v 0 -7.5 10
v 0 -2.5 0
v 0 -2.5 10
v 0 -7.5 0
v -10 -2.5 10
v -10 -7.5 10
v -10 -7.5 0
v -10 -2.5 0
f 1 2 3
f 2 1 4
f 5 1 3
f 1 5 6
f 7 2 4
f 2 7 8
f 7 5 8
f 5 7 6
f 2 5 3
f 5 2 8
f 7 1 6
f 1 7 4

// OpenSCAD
$fn = 50;


difference() {
	union() {
		translate(v = [-10.0000000000, -7.5000000000, 0]) {
			cube(size = [10, 5, 10]);
		}
	}
	union();
}
